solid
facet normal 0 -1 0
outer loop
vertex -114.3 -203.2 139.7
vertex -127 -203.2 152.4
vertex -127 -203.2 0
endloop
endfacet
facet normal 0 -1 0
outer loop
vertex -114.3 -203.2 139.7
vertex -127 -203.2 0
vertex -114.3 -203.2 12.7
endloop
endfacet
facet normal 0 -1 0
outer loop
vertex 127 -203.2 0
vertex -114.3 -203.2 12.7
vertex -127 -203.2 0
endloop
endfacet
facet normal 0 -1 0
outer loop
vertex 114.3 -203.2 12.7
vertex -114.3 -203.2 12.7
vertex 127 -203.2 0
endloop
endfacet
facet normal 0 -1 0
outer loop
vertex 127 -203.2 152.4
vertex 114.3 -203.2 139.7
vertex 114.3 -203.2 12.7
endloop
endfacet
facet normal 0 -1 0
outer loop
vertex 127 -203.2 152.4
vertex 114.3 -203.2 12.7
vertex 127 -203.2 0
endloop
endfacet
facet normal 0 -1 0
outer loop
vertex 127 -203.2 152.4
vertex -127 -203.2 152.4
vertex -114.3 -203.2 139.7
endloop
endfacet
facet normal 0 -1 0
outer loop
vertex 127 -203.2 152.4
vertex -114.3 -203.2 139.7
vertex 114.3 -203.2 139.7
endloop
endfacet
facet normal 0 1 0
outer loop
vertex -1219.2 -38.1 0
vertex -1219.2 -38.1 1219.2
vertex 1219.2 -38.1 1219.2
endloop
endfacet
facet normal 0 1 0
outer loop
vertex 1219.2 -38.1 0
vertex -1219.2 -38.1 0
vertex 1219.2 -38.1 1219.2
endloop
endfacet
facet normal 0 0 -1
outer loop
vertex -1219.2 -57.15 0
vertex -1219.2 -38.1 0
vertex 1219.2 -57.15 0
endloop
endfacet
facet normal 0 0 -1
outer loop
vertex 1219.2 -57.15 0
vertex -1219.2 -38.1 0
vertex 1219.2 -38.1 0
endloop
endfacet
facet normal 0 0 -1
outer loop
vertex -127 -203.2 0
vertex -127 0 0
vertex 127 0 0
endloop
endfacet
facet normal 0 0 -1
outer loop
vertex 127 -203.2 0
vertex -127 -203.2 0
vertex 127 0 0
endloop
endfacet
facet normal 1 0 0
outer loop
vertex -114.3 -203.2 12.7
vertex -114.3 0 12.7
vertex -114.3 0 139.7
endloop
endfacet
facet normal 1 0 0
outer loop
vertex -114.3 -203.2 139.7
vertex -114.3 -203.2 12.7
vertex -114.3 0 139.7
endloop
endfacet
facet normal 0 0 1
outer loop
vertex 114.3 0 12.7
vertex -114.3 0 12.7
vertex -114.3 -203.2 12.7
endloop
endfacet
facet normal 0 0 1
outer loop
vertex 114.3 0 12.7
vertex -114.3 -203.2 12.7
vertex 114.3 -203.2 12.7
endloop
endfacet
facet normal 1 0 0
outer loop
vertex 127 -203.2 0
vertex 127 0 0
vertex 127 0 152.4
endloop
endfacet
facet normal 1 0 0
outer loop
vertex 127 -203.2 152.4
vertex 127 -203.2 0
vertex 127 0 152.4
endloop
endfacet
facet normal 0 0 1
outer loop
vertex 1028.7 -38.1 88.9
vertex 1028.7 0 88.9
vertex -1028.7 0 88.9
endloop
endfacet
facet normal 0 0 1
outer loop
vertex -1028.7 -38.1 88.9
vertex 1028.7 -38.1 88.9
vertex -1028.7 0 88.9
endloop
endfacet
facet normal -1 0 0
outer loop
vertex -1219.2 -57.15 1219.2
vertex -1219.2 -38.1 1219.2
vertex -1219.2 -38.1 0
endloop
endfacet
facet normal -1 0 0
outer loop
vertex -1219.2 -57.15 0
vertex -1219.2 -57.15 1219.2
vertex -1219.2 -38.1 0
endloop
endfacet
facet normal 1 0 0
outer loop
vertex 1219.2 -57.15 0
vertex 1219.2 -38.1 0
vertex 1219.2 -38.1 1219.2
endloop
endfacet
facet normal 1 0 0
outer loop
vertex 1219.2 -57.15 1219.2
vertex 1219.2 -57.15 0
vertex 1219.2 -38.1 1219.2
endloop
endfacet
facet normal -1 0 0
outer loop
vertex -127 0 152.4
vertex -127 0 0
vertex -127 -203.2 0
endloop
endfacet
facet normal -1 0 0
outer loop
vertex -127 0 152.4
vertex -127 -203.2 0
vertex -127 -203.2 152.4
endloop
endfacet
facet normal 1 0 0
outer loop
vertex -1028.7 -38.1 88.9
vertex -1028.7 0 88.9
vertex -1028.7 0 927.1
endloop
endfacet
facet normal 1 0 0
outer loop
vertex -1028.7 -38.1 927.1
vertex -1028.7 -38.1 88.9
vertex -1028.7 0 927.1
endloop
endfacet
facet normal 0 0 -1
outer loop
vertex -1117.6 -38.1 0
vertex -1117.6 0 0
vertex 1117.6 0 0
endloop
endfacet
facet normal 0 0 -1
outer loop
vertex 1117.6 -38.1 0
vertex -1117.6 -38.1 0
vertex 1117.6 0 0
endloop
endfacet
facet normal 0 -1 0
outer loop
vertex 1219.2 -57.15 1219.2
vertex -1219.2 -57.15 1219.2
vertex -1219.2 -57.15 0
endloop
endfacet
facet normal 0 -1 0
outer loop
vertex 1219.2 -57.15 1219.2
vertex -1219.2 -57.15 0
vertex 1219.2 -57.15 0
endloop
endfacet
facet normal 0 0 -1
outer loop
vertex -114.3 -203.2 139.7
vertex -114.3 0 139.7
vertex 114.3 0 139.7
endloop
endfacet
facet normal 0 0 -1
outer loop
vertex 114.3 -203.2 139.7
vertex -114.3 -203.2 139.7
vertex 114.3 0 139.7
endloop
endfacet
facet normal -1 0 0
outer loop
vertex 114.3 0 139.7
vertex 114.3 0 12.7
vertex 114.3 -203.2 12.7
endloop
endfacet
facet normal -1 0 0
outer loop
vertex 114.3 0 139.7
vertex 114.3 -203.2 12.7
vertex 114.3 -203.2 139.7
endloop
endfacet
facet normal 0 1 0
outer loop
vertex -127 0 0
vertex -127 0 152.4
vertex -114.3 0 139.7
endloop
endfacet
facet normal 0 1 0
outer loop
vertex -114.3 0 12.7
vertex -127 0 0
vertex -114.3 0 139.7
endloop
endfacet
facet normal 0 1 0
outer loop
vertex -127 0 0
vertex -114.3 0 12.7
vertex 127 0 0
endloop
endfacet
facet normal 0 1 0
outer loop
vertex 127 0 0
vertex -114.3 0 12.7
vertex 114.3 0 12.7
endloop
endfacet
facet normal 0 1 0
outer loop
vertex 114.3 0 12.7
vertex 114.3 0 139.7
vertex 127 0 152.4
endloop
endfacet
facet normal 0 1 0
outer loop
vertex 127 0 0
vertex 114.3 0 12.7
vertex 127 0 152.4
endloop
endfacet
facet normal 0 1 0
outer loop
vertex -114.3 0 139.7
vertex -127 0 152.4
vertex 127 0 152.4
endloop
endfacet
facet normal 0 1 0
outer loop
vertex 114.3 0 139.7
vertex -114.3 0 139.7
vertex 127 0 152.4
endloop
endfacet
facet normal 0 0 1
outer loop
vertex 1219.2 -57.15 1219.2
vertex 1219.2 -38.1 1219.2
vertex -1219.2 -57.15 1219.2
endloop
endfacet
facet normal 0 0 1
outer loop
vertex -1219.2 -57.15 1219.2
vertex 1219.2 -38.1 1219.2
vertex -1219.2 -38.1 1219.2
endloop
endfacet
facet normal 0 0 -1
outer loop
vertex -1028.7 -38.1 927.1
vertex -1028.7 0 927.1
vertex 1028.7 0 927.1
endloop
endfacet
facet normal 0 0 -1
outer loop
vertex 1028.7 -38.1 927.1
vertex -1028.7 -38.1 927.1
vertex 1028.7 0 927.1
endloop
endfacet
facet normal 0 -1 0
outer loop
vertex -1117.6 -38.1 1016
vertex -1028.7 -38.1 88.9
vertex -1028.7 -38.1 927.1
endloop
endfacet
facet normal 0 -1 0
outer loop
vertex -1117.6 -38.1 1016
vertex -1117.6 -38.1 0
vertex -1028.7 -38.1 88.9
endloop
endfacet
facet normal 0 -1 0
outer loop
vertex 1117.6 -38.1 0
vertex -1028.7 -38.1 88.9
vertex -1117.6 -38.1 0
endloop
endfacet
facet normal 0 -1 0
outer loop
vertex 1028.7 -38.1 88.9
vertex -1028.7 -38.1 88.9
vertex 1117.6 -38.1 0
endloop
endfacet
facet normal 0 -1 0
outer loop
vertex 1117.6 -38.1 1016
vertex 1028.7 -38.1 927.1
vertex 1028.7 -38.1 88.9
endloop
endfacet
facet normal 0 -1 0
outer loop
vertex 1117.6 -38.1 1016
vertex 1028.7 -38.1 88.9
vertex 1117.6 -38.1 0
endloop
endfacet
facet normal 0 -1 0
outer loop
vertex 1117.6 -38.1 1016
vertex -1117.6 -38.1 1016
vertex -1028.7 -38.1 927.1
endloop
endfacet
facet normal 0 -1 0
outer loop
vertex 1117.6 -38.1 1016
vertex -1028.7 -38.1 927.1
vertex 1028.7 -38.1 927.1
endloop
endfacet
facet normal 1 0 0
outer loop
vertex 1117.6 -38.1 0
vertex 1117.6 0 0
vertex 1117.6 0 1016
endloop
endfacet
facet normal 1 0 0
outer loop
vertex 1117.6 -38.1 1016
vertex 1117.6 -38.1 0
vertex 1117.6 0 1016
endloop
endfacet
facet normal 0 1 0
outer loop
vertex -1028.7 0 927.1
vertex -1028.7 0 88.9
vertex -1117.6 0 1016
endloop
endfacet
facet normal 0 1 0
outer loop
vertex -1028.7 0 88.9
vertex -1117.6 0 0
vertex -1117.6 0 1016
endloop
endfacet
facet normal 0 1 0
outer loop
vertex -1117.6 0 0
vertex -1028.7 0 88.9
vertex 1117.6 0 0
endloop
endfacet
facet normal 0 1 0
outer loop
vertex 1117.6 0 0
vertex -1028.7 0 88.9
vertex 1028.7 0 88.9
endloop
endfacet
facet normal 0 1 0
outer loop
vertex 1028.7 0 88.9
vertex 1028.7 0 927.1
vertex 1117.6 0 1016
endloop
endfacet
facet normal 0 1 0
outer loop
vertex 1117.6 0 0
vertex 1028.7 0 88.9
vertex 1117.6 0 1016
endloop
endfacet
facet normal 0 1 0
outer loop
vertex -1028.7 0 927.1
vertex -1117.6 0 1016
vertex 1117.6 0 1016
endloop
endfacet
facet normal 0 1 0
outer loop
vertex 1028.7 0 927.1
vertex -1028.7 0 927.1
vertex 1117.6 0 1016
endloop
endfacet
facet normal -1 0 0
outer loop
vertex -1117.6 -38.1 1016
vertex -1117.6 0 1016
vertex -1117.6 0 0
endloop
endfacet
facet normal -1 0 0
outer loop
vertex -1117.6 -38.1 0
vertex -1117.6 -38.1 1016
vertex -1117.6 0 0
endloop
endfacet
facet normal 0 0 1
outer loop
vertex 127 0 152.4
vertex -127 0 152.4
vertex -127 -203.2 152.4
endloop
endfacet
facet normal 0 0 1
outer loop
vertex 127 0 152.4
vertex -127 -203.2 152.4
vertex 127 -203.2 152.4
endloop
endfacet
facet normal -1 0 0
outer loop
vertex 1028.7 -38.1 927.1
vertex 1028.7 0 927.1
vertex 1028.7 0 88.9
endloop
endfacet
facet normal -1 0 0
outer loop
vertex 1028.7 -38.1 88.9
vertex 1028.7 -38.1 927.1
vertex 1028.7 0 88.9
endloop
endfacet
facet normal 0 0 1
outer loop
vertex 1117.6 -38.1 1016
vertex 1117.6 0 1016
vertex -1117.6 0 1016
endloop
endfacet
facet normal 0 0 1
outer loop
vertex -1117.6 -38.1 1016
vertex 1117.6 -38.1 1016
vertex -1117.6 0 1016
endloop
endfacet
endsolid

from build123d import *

# Parameters (mm, degrees)
F1_DEPTH = 38.1
F2_W     = 2438.4
F2_H     = 1219.2
F3_DEPTH = 19.05
F4_W     = 254
F4_H     = 152.4
F4_W_2   = 228.6
F4_H_2   = 127
F5_DEPTH = 203.2


with BuildPart() as f1:
    # F0 (on Front) → F1 (new body)
    with BuildSketch(Plane.XZ):
        Polygon((-1117.6, 1016), (-1117.6, 0), (0, 0), (1117.6, 0), (1117.6, 1016), align=None)
        Polygon((1028.7, 88.9), (0, 88.9), (-1028.7, 88.9), (-1028.7, 927.1), (1028.7, 927.1), align=None, mode=Mode.SUBTRACT)
    extrude(amount=F1_DEPTH)


with BuildPart() as f3:
    # F2 (on face) → F3 (new body)
    with BuildSketch(Plane.XZ.offset(38.1)):
        Polygon((1219.2, 1219.2), (-1219.2, 1219.2), (-1219.2, 0), (-1117.6, 0), (-1117.6, 1016), (1117.6, 1016), (1117.6, 0), (1219.2, 0), align=None)
        with Locations((0, 609.6)):
            Rectangle(F2_W, F2_H)
    extrude(amount=F3_DEPTH)


with BuildPart() as f5:
    # F4 (on Front) → F5 (new body)
    with BuildSketch(Plane.XZ):
        with Locations((0, 76.2)):
            Rectangle(F4_W, F4_H)
        with Locations((0, 76.2)):
            Rectangle(F4_W_2, F4_H_2, mode=Mode.SUBTRACT)
    extrude(amount=F5_DEPTH)


solid = Compound([f1.part, f3.part, f5.part])
